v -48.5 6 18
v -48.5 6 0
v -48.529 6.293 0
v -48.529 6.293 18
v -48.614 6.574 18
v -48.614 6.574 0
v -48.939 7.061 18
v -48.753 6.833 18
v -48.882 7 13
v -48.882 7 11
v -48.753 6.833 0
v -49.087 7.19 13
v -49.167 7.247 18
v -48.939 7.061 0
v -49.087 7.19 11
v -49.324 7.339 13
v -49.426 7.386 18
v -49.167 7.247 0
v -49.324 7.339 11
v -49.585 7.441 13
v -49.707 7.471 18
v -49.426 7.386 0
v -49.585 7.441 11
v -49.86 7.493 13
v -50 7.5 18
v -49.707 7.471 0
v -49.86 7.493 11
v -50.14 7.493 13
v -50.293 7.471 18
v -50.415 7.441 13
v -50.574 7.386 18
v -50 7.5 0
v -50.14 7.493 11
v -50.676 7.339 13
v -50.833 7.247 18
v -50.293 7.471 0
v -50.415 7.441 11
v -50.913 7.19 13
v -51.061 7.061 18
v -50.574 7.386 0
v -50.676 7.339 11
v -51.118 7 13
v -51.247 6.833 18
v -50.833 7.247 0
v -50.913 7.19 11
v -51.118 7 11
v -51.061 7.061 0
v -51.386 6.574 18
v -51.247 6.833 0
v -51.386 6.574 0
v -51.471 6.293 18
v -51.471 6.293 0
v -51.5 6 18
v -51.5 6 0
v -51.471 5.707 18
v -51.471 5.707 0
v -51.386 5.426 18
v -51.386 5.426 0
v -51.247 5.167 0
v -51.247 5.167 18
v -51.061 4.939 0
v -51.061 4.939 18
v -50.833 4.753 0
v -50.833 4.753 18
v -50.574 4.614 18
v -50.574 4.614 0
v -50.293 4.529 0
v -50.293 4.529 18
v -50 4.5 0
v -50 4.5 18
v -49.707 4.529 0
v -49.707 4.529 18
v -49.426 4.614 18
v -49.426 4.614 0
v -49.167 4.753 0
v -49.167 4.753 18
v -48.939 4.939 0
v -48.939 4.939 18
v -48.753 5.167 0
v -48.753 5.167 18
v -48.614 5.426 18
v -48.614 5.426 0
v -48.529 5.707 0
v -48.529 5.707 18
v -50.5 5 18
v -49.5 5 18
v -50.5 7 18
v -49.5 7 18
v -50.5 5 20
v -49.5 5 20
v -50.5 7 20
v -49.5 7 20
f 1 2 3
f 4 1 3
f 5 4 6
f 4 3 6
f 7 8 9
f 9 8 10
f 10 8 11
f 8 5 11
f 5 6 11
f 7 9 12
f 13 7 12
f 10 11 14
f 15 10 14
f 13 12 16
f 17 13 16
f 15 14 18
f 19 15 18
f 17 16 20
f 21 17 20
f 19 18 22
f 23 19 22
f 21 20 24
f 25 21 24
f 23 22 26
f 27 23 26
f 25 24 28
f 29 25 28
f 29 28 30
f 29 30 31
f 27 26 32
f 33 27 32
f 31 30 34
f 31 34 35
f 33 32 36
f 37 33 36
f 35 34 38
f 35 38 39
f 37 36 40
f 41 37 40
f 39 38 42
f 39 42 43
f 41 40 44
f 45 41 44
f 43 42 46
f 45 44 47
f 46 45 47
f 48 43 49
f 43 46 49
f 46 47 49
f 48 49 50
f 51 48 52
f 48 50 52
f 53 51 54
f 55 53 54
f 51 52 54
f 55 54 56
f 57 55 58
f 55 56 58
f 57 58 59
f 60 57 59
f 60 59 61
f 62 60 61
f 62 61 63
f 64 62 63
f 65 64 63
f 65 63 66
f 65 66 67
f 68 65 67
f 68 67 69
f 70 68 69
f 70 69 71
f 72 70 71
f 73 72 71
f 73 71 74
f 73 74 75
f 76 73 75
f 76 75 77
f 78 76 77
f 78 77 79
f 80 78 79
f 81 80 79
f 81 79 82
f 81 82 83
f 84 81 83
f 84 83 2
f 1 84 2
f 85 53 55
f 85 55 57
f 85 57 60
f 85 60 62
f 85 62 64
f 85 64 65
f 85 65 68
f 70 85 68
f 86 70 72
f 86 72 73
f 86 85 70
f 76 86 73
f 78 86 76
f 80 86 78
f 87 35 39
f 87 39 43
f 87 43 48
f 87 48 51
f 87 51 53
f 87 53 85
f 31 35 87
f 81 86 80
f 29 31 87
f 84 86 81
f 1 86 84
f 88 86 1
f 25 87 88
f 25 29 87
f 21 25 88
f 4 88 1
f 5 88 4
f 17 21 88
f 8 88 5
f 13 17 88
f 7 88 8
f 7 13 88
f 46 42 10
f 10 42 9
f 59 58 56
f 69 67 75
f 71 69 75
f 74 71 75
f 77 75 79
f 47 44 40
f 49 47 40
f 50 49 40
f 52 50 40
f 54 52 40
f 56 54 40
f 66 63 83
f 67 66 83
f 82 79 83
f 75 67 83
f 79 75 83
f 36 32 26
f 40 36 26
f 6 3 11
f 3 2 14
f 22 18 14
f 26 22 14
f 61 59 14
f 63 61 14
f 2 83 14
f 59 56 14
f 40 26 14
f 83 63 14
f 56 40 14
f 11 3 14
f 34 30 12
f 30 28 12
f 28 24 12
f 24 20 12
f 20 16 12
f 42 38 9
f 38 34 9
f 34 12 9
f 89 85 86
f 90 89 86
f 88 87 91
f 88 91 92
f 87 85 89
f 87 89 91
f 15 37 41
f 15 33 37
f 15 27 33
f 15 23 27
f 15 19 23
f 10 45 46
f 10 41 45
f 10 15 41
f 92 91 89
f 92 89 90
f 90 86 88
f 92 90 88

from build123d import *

# Parameters (mm, degrees)
SKETCH1_R           = 1.5
BOSS_EXTRUDE1_DEPTH = 18
SKETCH2_W           = 1
SKETCH2_H           = 2
BOSS_EXTRUDE2_DEPTH = 2
CUT_EXTRUDE1_START  = -5
SKETCH3_W           = 2.236067978
SKETCH3_H           = 1
CUT_EXTRUDE1_DEPTH  = 2


with BuildPart() as part:
    # Sketch1 → Boss-Extrude1 (new body)
    with BuildSketch(Plane.XY):
        with Locations((-50, 6)):
            Circle(SKETCH1_R)
    extrude(amount=BOSS_EXTRUDE1_DEPTH)

    # Sketch2 → Boss-Extrude2 (add)
    with BuildSketch(Plane.XY.offset(18)):
        with Locations((-50, 6)):
            Rectangle(SKETCH2_W, SKETCH2_H)
    extrude(amount=BOSS_EXTRUDE2_DEPTH)

    # Sketch3 → Cut-Extrude1 (cut)
    with BuildSketch(Plane.XY.offset(18).offset(CUT_EXTRUDE1_START)):
        with Locations((-50, 7.5)):
            Rectangle(SKETCH3_W, SKETCH3_H)
    extrude(amount=-CUT_EXTRUDE1_DEPTH, mode=Mode.SUBTRACT)


solid = part.part
